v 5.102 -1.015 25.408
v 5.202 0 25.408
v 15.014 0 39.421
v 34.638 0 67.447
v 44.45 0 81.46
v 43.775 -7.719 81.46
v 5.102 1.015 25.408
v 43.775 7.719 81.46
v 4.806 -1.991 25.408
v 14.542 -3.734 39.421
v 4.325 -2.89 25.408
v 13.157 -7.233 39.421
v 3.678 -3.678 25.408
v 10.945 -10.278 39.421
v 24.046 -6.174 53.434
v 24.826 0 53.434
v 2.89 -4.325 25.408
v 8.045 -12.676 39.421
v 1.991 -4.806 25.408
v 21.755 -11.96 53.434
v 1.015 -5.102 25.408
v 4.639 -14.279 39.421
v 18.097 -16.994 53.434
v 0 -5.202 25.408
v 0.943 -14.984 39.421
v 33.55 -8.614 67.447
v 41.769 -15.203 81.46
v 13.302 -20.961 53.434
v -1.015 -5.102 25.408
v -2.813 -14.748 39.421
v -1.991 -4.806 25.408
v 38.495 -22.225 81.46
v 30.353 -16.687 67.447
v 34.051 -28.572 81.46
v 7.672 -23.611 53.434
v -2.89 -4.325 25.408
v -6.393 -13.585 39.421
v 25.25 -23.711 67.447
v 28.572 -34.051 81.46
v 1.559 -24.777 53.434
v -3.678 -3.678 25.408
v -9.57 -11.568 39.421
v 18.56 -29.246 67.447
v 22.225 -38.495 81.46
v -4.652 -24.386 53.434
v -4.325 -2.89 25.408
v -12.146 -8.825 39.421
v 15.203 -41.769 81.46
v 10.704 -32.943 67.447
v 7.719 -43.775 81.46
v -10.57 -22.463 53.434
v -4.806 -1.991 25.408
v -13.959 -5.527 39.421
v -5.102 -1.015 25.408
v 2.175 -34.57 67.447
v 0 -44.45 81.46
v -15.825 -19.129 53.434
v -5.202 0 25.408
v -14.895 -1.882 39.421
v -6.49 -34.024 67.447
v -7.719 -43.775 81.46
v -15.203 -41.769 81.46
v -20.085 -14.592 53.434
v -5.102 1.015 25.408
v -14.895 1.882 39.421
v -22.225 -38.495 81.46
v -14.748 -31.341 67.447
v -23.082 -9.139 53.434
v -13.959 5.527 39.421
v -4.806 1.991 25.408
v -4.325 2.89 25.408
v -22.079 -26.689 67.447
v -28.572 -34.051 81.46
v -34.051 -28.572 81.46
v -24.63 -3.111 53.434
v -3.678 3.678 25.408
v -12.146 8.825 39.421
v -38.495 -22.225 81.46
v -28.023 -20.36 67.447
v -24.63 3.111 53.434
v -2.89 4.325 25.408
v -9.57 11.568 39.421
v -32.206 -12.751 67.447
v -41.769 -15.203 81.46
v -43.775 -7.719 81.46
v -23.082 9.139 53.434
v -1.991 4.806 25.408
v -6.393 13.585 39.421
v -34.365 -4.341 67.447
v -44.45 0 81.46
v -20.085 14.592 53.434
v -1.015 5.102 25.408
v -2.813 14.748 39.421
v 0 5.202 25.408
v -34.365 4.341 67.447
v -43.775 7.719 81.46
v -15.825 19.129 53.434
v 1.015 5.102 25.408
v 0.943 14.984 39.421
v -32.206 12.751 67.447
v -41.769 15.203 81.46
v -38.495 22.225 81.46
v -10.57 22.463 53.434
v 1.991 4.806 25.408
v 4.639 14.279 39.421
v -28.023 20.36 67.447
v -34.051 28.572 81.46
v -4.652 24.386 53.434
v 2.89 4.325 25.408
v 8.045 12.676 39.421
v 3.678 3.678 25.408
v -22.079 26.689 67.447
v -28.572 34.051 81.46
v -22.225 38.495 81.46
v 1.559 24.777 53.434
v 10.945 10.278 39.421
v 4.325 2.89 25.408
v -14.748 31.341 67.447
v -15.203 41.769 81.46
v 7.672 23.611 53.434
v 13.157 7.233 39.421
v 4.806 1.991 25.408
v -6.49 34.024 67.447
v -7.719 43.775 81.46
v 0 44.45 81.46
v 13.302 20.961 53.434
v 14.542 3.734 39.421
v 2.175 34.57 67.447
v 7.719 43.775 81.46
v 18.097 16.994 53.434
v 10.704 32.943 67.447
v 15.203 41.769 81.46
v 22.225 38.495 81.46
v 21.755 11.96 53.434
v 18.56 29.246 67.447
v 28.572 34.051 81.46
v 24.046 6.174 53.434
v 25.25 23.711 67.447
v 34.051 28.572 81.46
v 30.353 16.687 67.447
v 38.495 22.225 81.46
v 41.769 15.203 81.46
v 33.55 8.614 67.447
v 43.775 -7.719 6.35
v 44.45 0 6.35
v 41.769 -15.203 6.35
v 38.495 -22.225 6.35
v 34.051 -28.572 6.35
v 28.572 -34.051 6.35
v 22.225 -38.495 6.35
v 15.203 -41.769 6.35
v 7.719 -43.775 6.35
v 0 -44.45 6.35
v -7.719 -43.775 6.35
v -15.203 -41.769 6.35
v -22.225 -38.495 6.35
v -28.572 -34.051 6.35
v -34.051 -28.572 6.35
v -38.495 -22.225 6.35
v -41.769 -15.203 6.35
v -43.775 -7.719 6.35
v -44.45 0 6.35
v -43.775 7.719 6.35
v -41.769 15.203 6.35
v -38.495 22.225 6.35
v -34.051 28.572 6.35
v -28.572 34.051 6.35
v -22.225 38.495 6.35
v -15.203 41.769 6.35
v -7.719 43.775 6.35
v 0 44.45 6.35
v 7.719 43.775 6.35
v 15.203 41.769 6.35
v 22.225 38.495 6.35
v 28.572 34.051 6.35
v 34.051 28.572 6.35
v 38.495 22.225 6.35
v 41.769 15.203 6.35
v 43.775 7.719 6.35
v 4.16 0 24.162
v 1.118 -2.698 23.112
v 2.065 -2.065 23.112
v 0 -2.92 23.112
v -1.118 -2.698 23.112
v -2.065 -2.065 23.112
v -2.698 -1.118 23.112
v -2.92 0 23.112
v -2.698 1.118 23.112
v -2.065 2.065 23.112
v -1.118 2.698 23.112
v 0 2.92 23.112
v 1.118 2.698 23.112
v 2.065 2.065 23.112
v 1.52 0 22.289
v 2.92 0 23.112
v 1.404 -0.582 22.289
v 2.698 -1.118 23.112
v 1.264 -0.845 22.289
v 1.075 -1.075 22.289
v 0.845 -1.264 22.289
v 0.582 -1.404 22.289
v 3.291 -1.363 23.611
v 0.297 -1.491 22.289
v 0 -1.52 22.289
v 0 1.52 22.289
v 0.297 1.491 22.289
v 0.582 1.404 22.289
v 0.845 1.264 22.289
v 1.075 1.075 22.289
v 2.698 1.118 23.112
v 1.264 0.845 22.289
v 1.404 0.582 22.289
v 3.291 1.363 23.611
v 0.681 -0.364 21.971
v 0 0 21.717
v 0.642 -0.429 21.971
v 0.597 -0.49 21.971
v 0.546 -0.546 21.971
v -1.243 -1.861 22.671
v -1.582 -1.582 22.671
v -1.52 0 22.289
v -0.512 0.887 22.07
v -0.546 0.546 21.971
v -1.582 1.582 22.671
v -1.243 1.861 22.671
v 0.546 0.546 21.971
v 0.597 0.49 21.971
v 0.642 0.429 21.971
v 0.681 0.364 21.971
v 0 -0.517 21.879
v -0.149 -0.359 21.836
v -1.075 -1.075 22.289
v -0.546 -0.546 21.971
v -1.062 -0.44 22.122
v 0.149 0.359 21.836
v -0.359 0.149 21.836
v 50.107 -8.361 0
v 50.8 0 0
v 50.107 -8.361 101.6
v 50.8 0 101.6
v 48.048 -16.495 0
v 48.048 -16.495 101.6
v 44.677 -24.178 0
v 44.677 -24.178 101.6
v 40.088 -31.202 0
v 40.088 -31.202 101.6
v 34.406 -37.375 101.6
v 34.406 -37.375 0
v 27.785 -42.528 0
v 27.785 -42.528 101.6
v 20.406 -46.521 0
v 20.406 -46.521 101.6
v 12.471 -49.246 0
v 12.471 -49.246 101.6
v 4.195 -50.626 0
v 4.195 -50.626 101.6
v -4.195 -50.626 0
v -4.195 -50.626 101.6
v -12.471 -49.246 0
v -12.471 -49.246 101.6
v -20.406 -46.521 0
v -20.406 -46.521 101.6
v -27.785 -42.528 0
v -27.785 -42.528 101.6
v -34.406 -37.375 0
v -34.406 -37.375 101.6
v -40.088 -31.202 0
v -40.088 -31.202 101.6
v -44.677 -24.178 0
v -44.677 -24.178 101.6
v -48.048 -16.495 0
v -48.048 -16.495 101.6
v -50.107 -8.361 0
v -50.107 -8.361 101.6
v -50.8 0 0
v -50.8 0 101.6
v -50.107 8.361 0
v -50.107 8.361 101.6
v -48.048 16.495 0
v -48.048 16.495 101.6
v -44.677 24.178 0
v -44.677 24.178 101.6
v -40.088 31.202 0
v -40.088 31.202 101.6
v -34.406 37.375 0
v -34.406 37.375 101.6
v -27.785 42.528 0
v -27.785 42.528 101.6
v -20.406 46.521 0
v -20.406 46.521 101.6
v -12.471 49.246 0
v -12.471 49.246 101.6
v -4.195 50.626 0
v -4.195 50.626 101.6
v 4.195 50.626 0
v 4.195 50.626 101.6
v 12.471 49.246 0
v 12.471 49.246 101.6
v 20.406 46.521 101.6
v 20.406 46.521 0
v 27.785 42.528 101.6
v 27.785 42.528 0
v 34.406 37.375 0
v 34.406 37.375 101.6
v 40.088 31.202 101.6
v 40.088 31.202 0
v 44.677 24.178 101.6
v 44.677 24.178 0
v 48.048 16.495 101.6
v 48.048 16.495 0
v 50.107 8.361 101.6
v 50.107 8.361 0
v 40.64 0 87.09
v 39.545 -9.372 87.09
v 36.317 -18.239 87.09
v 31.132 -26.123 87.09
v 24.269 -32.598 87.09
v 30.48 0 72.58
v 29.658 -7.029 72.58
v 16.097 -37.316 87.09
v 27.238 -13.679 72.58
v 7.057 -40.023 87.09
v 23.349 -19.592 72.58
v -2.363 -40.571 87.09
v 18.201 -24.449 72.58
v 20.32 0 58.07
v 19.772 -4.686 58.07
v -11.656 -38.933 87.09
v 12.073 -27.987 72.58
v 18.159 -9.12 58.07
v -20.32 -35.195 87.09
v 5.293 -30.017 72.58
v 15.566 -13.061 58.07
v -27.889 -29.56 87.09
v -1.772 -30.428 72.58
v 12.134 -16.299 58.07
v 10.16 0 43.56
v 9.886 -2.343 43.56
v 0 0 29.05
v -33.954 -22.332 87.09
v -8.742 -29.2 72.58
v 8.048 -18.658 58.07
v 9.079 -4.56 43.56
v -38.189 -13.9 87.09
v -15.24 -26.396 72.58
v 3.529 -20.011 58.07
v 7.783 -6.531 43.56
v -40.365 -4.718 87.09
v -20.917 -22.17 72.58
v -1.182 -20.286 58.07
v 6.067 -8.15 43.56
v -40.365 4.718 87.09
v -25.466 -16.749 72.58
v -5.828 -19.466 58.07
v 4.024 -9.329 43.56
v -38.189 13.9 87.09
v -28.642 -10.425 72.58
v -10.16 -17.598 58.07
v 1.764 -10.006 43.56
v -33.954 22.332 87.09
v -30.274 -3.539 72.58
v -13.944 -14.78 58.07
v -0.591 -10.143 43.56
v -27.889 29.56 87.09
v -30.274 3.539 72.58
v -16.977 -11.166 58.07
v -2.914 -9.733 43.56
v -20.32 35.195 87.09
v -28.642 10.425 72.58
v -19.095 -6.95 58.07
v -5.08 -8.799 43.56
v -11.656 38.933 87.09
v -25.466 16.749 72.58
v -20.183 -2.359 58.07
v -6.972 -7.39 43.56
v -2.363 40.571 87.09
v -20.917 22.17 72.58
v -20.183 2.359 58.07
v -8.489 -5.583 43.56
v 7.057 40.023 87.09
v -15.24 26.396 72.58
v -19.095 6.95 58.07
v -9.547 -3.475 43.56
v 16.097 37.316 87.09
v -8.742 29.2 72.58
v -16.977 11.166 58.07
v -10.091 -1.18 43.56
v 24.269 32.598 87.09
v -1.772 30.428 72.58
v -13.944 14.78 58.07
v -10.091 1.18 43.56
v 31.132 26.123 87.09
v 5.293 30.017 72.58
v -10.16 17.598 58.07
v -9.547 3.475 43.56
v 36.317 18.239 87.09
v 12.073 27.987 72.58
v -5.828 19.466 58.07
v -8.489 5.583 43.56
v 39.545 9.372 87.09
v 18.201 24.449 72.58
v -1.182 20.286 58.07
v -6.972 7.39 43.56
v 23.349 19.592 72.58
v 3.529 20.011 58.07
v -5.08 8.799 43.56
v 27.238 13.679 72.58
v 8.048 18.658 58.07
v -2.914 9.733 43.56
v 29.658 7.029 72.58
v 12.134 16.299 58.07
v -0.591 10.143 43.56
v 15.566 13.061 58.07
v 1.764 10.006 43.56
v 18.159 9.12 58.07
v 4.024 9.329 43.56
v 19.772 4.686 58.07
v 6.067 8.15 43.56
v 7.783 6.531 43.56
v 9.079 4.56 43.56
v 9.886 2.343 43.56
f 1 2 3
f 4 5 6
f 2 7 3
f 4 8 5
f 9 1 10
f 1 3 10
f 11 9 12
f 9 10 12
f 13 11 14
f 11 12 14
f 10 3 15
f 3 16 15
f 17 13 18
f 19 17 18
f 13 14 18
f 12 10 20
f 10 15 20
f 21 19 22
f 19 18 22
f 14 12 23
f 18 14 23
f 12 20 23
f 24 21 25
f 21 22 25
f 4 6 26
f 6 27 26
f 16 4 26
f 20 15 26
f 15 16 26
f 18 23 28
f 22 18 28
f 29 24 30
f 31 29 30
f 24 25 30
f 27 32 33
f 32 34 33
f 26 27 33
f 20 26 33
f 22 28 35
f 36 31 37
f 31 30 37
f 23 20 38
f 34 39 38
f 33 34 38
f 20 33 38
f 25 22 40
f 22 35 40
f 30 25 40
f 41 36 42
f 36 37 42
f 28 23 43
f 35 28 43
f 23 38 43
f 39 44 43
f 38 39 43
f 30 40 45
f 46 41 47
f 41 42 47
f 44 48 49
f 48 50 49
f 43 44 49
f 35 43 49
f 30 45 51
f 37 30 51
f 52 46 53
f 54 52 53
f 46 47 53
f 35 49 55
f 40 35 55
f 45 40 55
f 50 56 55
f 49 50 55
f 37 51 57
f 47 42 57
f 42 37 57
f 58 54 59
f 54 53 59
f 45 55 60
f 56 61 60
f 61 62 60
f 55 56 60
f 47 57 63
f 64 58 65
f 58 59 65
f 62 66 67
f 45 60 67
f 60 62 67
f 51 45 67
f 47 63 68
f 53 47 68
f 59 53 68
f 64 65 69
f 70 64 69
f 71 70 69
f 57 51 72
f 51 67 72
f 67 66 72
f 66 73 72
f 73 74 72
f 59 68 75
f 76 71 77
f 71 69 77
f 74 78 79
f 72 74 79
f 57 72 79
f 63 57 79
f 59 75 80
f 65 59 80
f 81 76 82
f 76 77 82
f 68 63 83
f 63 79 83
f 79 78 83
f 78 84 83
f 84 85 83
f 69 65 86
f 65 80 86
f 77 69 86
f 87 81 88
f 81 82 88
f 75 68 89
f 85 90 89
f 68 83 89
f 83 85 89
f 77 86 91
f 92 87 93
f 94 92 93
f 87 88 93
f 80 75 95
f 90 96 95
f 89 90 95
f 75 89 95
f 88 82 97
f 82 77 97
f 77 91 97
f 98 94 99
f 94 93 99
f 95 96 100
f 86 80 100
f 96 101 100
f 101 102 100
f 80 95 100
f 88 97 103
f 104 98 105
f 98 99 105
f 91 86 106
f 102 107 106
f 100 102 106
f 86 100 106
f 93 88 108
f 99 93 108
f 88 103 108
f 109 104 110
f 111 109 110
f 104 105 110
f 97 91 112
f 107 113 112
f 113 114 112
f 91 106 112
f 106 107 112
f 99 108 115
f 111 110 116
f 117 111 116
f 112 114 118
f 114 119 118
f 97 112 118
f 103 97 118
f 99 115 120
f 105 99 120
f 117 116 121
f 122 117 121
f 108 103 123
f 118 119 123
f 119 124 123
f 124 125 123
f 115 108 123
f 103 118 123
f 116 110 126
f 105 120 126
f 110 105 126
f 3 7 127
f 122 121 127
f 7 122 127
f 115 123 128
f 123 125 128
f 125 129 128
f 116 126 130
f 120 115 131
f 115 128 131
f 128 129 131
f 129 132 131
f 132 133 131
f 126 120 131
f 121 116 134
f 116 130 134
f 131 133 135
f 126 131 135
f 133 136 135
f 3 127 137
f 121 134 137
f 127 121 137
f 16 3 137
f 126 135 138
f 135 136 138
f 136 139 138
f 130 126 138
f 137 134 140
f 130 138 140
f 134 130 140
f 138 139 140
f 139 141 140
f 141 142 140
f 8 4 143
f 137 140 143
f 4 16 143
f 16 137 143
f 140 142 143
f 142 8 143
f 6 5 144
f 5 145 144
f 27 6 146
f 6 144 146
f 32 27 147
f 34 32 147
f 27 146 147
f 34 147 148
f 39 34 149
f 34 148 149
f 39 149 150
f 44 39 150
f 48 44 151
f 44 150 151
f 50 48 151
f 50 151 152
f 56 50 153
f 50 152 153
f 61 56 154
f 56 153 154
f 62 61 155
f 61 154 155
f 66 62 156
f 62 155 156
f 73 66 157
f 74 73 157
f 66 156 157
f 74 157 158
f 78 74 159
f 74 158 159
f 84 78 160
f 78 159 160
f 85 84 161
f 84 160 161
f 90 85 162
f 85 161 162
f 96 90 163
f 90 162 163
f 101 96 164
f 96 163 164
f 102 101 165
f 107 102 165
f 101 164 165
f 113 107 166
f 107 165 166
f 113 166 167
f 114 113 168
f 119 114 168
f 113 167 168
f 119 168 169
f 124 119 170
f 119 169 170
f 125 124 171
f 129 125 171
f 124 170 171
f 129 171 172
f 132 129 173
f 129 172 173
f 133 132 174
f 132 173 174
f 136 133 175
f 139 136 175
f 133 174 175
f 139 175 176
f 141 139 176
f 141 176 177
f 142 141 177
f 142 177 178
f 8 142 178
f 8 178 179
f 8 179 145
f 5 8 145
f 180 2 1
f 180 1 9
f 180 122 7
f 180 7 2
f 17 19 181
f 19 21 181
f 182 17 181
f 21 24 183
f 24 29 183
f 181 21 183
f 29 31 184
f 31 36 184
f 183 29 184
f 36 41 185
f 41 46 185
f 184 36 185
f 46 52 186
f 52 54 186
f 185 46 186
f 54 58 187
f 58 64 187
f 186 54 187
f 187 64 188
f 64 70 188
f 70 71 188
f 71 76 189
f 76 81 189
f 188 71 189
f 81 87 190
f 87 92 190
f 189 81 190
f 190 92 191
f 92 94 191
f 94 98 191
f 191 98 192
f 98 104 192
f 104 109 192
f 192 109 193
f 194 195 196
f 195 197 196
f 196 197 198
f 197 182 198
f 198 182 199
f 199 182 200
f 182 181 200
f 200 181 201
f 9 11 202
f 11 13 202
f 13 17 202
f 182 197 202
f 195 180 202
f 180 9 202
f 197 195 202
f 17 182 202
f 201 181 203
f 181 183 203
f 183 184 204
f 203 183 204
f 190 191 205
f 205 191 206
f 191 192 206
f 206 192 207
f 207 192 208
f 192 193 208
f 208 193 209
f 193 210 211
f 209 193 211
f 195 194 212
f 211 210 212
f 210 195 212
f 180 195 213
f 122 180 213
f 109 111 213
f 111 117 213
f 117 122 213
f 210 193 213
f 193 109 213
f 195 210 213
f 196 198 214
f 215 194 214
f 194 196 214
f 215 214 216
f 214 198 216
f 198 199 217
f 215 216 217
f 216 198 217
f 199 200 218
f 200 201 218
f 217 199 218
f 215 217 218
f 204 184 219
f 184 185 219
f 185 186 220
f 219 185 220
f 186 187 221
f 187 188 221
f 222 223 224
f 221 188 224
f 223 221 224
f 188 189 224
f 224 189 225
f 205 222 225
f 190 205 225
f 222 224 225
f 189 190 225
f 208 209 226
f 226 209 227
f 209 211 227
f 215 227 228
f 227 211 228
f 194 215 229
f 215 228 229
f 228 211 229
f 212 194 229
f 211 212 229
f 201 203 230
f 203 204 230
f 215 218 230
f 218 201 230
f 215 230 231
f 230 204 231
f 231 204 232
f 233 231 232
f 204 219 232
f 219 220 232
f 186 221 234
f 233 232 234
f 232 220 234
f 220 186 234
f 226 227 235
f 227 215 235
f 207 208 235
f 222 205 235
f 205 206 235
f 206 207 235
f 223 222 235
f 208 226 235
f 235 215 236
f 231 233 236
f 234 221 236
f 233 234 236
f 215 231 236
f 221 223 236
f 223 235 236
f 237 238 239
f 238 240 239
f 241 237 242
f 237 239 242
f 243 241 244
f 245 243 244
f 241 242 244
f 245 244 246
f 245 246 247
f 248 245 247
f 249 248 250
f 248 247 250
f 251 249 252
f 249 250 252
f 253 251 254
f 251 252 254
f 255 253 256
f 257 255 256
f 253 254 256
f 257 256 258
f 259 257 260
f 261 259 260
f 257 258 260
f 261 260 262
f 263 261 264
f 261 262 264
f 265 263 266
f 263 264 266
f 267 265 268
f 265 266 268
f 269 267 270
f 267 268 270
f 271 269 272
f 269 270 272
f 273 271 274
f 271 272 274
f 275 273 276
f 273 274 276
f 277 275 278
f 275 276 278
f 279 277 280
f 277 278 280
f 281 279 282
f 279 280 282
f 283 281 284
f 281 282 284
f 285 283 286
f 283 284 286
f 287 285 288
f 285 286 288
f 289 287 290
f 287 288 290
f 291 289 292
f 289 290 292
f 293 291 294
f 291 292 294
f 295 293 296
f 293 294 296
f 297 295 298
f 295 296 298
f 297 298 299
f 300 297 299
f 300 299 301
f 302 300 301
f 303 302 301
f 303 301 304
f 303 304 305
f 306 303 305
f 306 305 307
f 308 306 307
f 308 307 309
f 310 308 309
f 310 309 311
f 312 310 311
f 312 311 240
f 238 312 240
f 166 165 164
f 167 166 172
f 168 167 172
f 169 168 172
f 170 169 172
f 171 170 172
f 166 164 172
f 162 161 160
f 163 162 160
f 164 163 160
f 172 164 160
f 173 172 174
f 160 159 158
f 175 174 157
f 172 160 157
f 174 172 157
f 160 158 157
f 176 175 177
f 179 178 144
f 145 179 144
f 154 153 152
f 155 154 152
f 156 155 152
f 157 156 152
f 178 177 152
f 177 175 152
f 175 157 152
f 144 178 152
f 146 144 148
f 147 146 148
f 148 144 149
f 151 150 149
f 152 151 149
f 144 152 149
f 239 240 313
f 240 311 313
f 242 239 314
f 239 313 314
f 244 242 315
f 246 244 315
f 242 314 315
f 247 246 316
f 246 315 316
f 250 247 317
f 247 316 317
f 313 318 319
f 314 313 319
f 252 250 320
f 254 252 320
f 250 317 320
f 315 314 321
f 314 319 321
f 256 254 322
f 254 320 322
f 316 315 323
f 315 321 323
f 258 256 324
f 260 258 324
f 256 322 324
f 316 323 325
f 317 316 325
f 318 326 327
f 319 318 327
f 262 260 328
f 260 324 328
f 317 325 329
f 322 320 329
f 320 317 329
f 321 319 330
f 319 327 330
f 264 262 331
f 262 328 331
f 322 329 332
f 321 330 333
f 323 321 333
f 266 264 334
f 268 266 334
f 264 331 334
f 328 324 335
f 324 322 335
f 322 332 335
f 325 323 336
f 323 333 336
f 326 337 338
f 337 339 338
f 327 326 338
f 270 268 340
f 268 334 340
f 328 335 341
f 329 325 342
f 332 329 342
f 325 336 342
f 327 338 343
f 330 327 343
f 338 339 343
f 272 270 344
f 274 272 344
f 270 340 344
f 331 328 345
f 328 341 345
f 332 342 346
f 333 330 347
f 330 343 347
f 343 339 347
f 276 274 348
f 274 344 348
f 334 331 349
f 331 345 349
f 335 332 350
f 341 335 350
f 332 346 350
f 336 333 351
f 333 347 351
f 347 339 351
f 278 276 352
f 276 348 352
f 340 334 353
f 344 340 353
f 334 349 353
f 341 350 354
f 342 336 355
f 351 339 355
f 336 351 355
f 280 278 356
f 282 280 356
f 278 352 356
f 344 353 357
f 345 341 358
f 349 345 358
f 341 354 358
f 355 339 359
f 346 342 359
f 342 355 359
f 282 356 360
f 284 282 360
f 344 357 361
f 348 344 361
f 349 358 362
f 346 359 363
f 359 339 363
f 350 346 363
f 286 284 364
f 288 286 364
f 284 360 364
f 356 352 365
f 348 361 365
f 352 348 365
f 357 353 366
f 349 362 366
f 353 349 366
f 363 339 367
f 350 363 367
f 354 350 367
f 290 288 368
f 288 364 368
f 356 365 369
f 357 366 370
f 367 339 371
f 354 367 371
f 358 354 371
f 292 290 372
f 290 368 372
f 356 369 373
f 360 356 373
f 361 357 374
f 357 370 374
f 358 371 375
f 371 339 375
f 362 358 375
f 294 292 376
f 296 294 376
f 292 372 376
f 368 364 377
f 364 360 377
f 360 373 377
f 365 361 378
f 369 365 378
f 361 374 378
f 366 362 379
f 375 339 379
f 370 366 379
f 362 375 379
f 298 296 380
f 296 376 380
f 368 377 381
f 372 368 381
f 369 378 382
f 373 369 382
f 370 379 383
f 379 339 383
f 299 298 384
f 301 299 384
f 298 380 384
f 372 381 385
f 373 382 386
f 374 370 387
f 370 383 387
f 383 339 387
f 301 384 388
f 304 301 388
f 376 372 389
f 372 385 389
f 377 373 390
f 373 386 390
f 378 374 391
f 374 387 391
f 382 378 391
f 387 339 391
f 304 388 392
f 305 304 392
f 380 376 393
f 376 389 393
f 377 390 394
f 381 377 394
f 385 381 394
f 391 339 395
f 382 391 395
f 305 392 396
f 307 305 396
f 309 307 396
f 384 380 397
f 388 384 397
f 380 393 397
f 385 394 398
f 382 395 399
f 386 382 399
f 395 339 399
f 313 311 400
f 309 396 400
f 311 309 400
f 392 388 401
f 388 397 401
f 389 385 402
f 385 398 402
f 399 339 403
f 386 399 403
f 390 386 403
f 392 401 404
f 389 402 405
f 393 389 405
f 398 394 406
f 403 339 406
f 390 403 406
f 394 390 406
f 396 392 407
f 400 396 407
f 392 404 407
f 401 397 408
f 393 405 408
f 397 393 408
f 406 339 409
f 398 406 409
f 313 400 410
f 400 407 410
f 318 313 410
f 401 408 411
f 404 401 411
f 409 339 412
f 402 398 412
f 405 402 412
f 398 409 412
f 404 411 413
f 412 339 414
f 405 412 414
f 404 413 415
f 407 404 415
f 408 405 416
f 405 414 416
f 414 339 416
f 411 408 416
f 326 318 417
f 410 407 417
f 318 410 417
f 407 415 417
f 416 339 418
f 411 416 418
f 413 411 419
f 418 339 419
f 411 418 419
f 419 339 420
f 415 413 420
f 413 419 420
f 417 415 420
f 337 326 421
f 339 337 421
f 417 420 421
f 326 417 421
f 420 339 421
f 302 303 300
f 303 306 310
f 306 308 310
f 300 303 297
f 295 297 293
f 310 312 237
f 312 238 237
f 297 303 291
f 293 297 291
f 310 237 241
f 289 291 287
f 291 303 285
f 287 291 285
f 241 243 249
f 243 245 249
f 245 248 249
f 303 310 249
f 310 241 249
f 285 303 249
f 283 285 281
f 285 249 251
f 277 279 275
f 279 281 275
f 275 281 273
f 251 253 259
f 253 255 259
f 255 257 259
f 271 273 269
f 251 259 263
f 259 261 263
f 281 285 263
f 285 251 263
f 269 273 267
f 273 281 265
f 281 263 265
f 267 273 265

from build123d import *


with BuildPart() as f1:
    # F0 (on Front) → F1 (revolve)
    with BuildSketch(Plane.XZ):
        with BuildLine():
            Line((0, 6.35), (0, 0))
            Line((0, 0), (50.8, 0))
            Line((50.8, 0), (50.8, 101.6))
            Line((50.8, 101.6), (0, 29.050081))
            Line((0, 29.050081), (0, 21.717098))
            ThreePointArc((0, 21.717098), (2.920268, 23.11225), (5.201615, 25.407871))
            Line((5.201615, 25.407871), (44.45, 81.460373))
            Line((44.45, 81.460373), (44.45, 6.35))
            Line((44.45, 6.35), (0, 6.35))
        make_face()
    revolve(axis=Axis((0, 0, 14.525041), (0, 0, -1)))


solid = f1.part
